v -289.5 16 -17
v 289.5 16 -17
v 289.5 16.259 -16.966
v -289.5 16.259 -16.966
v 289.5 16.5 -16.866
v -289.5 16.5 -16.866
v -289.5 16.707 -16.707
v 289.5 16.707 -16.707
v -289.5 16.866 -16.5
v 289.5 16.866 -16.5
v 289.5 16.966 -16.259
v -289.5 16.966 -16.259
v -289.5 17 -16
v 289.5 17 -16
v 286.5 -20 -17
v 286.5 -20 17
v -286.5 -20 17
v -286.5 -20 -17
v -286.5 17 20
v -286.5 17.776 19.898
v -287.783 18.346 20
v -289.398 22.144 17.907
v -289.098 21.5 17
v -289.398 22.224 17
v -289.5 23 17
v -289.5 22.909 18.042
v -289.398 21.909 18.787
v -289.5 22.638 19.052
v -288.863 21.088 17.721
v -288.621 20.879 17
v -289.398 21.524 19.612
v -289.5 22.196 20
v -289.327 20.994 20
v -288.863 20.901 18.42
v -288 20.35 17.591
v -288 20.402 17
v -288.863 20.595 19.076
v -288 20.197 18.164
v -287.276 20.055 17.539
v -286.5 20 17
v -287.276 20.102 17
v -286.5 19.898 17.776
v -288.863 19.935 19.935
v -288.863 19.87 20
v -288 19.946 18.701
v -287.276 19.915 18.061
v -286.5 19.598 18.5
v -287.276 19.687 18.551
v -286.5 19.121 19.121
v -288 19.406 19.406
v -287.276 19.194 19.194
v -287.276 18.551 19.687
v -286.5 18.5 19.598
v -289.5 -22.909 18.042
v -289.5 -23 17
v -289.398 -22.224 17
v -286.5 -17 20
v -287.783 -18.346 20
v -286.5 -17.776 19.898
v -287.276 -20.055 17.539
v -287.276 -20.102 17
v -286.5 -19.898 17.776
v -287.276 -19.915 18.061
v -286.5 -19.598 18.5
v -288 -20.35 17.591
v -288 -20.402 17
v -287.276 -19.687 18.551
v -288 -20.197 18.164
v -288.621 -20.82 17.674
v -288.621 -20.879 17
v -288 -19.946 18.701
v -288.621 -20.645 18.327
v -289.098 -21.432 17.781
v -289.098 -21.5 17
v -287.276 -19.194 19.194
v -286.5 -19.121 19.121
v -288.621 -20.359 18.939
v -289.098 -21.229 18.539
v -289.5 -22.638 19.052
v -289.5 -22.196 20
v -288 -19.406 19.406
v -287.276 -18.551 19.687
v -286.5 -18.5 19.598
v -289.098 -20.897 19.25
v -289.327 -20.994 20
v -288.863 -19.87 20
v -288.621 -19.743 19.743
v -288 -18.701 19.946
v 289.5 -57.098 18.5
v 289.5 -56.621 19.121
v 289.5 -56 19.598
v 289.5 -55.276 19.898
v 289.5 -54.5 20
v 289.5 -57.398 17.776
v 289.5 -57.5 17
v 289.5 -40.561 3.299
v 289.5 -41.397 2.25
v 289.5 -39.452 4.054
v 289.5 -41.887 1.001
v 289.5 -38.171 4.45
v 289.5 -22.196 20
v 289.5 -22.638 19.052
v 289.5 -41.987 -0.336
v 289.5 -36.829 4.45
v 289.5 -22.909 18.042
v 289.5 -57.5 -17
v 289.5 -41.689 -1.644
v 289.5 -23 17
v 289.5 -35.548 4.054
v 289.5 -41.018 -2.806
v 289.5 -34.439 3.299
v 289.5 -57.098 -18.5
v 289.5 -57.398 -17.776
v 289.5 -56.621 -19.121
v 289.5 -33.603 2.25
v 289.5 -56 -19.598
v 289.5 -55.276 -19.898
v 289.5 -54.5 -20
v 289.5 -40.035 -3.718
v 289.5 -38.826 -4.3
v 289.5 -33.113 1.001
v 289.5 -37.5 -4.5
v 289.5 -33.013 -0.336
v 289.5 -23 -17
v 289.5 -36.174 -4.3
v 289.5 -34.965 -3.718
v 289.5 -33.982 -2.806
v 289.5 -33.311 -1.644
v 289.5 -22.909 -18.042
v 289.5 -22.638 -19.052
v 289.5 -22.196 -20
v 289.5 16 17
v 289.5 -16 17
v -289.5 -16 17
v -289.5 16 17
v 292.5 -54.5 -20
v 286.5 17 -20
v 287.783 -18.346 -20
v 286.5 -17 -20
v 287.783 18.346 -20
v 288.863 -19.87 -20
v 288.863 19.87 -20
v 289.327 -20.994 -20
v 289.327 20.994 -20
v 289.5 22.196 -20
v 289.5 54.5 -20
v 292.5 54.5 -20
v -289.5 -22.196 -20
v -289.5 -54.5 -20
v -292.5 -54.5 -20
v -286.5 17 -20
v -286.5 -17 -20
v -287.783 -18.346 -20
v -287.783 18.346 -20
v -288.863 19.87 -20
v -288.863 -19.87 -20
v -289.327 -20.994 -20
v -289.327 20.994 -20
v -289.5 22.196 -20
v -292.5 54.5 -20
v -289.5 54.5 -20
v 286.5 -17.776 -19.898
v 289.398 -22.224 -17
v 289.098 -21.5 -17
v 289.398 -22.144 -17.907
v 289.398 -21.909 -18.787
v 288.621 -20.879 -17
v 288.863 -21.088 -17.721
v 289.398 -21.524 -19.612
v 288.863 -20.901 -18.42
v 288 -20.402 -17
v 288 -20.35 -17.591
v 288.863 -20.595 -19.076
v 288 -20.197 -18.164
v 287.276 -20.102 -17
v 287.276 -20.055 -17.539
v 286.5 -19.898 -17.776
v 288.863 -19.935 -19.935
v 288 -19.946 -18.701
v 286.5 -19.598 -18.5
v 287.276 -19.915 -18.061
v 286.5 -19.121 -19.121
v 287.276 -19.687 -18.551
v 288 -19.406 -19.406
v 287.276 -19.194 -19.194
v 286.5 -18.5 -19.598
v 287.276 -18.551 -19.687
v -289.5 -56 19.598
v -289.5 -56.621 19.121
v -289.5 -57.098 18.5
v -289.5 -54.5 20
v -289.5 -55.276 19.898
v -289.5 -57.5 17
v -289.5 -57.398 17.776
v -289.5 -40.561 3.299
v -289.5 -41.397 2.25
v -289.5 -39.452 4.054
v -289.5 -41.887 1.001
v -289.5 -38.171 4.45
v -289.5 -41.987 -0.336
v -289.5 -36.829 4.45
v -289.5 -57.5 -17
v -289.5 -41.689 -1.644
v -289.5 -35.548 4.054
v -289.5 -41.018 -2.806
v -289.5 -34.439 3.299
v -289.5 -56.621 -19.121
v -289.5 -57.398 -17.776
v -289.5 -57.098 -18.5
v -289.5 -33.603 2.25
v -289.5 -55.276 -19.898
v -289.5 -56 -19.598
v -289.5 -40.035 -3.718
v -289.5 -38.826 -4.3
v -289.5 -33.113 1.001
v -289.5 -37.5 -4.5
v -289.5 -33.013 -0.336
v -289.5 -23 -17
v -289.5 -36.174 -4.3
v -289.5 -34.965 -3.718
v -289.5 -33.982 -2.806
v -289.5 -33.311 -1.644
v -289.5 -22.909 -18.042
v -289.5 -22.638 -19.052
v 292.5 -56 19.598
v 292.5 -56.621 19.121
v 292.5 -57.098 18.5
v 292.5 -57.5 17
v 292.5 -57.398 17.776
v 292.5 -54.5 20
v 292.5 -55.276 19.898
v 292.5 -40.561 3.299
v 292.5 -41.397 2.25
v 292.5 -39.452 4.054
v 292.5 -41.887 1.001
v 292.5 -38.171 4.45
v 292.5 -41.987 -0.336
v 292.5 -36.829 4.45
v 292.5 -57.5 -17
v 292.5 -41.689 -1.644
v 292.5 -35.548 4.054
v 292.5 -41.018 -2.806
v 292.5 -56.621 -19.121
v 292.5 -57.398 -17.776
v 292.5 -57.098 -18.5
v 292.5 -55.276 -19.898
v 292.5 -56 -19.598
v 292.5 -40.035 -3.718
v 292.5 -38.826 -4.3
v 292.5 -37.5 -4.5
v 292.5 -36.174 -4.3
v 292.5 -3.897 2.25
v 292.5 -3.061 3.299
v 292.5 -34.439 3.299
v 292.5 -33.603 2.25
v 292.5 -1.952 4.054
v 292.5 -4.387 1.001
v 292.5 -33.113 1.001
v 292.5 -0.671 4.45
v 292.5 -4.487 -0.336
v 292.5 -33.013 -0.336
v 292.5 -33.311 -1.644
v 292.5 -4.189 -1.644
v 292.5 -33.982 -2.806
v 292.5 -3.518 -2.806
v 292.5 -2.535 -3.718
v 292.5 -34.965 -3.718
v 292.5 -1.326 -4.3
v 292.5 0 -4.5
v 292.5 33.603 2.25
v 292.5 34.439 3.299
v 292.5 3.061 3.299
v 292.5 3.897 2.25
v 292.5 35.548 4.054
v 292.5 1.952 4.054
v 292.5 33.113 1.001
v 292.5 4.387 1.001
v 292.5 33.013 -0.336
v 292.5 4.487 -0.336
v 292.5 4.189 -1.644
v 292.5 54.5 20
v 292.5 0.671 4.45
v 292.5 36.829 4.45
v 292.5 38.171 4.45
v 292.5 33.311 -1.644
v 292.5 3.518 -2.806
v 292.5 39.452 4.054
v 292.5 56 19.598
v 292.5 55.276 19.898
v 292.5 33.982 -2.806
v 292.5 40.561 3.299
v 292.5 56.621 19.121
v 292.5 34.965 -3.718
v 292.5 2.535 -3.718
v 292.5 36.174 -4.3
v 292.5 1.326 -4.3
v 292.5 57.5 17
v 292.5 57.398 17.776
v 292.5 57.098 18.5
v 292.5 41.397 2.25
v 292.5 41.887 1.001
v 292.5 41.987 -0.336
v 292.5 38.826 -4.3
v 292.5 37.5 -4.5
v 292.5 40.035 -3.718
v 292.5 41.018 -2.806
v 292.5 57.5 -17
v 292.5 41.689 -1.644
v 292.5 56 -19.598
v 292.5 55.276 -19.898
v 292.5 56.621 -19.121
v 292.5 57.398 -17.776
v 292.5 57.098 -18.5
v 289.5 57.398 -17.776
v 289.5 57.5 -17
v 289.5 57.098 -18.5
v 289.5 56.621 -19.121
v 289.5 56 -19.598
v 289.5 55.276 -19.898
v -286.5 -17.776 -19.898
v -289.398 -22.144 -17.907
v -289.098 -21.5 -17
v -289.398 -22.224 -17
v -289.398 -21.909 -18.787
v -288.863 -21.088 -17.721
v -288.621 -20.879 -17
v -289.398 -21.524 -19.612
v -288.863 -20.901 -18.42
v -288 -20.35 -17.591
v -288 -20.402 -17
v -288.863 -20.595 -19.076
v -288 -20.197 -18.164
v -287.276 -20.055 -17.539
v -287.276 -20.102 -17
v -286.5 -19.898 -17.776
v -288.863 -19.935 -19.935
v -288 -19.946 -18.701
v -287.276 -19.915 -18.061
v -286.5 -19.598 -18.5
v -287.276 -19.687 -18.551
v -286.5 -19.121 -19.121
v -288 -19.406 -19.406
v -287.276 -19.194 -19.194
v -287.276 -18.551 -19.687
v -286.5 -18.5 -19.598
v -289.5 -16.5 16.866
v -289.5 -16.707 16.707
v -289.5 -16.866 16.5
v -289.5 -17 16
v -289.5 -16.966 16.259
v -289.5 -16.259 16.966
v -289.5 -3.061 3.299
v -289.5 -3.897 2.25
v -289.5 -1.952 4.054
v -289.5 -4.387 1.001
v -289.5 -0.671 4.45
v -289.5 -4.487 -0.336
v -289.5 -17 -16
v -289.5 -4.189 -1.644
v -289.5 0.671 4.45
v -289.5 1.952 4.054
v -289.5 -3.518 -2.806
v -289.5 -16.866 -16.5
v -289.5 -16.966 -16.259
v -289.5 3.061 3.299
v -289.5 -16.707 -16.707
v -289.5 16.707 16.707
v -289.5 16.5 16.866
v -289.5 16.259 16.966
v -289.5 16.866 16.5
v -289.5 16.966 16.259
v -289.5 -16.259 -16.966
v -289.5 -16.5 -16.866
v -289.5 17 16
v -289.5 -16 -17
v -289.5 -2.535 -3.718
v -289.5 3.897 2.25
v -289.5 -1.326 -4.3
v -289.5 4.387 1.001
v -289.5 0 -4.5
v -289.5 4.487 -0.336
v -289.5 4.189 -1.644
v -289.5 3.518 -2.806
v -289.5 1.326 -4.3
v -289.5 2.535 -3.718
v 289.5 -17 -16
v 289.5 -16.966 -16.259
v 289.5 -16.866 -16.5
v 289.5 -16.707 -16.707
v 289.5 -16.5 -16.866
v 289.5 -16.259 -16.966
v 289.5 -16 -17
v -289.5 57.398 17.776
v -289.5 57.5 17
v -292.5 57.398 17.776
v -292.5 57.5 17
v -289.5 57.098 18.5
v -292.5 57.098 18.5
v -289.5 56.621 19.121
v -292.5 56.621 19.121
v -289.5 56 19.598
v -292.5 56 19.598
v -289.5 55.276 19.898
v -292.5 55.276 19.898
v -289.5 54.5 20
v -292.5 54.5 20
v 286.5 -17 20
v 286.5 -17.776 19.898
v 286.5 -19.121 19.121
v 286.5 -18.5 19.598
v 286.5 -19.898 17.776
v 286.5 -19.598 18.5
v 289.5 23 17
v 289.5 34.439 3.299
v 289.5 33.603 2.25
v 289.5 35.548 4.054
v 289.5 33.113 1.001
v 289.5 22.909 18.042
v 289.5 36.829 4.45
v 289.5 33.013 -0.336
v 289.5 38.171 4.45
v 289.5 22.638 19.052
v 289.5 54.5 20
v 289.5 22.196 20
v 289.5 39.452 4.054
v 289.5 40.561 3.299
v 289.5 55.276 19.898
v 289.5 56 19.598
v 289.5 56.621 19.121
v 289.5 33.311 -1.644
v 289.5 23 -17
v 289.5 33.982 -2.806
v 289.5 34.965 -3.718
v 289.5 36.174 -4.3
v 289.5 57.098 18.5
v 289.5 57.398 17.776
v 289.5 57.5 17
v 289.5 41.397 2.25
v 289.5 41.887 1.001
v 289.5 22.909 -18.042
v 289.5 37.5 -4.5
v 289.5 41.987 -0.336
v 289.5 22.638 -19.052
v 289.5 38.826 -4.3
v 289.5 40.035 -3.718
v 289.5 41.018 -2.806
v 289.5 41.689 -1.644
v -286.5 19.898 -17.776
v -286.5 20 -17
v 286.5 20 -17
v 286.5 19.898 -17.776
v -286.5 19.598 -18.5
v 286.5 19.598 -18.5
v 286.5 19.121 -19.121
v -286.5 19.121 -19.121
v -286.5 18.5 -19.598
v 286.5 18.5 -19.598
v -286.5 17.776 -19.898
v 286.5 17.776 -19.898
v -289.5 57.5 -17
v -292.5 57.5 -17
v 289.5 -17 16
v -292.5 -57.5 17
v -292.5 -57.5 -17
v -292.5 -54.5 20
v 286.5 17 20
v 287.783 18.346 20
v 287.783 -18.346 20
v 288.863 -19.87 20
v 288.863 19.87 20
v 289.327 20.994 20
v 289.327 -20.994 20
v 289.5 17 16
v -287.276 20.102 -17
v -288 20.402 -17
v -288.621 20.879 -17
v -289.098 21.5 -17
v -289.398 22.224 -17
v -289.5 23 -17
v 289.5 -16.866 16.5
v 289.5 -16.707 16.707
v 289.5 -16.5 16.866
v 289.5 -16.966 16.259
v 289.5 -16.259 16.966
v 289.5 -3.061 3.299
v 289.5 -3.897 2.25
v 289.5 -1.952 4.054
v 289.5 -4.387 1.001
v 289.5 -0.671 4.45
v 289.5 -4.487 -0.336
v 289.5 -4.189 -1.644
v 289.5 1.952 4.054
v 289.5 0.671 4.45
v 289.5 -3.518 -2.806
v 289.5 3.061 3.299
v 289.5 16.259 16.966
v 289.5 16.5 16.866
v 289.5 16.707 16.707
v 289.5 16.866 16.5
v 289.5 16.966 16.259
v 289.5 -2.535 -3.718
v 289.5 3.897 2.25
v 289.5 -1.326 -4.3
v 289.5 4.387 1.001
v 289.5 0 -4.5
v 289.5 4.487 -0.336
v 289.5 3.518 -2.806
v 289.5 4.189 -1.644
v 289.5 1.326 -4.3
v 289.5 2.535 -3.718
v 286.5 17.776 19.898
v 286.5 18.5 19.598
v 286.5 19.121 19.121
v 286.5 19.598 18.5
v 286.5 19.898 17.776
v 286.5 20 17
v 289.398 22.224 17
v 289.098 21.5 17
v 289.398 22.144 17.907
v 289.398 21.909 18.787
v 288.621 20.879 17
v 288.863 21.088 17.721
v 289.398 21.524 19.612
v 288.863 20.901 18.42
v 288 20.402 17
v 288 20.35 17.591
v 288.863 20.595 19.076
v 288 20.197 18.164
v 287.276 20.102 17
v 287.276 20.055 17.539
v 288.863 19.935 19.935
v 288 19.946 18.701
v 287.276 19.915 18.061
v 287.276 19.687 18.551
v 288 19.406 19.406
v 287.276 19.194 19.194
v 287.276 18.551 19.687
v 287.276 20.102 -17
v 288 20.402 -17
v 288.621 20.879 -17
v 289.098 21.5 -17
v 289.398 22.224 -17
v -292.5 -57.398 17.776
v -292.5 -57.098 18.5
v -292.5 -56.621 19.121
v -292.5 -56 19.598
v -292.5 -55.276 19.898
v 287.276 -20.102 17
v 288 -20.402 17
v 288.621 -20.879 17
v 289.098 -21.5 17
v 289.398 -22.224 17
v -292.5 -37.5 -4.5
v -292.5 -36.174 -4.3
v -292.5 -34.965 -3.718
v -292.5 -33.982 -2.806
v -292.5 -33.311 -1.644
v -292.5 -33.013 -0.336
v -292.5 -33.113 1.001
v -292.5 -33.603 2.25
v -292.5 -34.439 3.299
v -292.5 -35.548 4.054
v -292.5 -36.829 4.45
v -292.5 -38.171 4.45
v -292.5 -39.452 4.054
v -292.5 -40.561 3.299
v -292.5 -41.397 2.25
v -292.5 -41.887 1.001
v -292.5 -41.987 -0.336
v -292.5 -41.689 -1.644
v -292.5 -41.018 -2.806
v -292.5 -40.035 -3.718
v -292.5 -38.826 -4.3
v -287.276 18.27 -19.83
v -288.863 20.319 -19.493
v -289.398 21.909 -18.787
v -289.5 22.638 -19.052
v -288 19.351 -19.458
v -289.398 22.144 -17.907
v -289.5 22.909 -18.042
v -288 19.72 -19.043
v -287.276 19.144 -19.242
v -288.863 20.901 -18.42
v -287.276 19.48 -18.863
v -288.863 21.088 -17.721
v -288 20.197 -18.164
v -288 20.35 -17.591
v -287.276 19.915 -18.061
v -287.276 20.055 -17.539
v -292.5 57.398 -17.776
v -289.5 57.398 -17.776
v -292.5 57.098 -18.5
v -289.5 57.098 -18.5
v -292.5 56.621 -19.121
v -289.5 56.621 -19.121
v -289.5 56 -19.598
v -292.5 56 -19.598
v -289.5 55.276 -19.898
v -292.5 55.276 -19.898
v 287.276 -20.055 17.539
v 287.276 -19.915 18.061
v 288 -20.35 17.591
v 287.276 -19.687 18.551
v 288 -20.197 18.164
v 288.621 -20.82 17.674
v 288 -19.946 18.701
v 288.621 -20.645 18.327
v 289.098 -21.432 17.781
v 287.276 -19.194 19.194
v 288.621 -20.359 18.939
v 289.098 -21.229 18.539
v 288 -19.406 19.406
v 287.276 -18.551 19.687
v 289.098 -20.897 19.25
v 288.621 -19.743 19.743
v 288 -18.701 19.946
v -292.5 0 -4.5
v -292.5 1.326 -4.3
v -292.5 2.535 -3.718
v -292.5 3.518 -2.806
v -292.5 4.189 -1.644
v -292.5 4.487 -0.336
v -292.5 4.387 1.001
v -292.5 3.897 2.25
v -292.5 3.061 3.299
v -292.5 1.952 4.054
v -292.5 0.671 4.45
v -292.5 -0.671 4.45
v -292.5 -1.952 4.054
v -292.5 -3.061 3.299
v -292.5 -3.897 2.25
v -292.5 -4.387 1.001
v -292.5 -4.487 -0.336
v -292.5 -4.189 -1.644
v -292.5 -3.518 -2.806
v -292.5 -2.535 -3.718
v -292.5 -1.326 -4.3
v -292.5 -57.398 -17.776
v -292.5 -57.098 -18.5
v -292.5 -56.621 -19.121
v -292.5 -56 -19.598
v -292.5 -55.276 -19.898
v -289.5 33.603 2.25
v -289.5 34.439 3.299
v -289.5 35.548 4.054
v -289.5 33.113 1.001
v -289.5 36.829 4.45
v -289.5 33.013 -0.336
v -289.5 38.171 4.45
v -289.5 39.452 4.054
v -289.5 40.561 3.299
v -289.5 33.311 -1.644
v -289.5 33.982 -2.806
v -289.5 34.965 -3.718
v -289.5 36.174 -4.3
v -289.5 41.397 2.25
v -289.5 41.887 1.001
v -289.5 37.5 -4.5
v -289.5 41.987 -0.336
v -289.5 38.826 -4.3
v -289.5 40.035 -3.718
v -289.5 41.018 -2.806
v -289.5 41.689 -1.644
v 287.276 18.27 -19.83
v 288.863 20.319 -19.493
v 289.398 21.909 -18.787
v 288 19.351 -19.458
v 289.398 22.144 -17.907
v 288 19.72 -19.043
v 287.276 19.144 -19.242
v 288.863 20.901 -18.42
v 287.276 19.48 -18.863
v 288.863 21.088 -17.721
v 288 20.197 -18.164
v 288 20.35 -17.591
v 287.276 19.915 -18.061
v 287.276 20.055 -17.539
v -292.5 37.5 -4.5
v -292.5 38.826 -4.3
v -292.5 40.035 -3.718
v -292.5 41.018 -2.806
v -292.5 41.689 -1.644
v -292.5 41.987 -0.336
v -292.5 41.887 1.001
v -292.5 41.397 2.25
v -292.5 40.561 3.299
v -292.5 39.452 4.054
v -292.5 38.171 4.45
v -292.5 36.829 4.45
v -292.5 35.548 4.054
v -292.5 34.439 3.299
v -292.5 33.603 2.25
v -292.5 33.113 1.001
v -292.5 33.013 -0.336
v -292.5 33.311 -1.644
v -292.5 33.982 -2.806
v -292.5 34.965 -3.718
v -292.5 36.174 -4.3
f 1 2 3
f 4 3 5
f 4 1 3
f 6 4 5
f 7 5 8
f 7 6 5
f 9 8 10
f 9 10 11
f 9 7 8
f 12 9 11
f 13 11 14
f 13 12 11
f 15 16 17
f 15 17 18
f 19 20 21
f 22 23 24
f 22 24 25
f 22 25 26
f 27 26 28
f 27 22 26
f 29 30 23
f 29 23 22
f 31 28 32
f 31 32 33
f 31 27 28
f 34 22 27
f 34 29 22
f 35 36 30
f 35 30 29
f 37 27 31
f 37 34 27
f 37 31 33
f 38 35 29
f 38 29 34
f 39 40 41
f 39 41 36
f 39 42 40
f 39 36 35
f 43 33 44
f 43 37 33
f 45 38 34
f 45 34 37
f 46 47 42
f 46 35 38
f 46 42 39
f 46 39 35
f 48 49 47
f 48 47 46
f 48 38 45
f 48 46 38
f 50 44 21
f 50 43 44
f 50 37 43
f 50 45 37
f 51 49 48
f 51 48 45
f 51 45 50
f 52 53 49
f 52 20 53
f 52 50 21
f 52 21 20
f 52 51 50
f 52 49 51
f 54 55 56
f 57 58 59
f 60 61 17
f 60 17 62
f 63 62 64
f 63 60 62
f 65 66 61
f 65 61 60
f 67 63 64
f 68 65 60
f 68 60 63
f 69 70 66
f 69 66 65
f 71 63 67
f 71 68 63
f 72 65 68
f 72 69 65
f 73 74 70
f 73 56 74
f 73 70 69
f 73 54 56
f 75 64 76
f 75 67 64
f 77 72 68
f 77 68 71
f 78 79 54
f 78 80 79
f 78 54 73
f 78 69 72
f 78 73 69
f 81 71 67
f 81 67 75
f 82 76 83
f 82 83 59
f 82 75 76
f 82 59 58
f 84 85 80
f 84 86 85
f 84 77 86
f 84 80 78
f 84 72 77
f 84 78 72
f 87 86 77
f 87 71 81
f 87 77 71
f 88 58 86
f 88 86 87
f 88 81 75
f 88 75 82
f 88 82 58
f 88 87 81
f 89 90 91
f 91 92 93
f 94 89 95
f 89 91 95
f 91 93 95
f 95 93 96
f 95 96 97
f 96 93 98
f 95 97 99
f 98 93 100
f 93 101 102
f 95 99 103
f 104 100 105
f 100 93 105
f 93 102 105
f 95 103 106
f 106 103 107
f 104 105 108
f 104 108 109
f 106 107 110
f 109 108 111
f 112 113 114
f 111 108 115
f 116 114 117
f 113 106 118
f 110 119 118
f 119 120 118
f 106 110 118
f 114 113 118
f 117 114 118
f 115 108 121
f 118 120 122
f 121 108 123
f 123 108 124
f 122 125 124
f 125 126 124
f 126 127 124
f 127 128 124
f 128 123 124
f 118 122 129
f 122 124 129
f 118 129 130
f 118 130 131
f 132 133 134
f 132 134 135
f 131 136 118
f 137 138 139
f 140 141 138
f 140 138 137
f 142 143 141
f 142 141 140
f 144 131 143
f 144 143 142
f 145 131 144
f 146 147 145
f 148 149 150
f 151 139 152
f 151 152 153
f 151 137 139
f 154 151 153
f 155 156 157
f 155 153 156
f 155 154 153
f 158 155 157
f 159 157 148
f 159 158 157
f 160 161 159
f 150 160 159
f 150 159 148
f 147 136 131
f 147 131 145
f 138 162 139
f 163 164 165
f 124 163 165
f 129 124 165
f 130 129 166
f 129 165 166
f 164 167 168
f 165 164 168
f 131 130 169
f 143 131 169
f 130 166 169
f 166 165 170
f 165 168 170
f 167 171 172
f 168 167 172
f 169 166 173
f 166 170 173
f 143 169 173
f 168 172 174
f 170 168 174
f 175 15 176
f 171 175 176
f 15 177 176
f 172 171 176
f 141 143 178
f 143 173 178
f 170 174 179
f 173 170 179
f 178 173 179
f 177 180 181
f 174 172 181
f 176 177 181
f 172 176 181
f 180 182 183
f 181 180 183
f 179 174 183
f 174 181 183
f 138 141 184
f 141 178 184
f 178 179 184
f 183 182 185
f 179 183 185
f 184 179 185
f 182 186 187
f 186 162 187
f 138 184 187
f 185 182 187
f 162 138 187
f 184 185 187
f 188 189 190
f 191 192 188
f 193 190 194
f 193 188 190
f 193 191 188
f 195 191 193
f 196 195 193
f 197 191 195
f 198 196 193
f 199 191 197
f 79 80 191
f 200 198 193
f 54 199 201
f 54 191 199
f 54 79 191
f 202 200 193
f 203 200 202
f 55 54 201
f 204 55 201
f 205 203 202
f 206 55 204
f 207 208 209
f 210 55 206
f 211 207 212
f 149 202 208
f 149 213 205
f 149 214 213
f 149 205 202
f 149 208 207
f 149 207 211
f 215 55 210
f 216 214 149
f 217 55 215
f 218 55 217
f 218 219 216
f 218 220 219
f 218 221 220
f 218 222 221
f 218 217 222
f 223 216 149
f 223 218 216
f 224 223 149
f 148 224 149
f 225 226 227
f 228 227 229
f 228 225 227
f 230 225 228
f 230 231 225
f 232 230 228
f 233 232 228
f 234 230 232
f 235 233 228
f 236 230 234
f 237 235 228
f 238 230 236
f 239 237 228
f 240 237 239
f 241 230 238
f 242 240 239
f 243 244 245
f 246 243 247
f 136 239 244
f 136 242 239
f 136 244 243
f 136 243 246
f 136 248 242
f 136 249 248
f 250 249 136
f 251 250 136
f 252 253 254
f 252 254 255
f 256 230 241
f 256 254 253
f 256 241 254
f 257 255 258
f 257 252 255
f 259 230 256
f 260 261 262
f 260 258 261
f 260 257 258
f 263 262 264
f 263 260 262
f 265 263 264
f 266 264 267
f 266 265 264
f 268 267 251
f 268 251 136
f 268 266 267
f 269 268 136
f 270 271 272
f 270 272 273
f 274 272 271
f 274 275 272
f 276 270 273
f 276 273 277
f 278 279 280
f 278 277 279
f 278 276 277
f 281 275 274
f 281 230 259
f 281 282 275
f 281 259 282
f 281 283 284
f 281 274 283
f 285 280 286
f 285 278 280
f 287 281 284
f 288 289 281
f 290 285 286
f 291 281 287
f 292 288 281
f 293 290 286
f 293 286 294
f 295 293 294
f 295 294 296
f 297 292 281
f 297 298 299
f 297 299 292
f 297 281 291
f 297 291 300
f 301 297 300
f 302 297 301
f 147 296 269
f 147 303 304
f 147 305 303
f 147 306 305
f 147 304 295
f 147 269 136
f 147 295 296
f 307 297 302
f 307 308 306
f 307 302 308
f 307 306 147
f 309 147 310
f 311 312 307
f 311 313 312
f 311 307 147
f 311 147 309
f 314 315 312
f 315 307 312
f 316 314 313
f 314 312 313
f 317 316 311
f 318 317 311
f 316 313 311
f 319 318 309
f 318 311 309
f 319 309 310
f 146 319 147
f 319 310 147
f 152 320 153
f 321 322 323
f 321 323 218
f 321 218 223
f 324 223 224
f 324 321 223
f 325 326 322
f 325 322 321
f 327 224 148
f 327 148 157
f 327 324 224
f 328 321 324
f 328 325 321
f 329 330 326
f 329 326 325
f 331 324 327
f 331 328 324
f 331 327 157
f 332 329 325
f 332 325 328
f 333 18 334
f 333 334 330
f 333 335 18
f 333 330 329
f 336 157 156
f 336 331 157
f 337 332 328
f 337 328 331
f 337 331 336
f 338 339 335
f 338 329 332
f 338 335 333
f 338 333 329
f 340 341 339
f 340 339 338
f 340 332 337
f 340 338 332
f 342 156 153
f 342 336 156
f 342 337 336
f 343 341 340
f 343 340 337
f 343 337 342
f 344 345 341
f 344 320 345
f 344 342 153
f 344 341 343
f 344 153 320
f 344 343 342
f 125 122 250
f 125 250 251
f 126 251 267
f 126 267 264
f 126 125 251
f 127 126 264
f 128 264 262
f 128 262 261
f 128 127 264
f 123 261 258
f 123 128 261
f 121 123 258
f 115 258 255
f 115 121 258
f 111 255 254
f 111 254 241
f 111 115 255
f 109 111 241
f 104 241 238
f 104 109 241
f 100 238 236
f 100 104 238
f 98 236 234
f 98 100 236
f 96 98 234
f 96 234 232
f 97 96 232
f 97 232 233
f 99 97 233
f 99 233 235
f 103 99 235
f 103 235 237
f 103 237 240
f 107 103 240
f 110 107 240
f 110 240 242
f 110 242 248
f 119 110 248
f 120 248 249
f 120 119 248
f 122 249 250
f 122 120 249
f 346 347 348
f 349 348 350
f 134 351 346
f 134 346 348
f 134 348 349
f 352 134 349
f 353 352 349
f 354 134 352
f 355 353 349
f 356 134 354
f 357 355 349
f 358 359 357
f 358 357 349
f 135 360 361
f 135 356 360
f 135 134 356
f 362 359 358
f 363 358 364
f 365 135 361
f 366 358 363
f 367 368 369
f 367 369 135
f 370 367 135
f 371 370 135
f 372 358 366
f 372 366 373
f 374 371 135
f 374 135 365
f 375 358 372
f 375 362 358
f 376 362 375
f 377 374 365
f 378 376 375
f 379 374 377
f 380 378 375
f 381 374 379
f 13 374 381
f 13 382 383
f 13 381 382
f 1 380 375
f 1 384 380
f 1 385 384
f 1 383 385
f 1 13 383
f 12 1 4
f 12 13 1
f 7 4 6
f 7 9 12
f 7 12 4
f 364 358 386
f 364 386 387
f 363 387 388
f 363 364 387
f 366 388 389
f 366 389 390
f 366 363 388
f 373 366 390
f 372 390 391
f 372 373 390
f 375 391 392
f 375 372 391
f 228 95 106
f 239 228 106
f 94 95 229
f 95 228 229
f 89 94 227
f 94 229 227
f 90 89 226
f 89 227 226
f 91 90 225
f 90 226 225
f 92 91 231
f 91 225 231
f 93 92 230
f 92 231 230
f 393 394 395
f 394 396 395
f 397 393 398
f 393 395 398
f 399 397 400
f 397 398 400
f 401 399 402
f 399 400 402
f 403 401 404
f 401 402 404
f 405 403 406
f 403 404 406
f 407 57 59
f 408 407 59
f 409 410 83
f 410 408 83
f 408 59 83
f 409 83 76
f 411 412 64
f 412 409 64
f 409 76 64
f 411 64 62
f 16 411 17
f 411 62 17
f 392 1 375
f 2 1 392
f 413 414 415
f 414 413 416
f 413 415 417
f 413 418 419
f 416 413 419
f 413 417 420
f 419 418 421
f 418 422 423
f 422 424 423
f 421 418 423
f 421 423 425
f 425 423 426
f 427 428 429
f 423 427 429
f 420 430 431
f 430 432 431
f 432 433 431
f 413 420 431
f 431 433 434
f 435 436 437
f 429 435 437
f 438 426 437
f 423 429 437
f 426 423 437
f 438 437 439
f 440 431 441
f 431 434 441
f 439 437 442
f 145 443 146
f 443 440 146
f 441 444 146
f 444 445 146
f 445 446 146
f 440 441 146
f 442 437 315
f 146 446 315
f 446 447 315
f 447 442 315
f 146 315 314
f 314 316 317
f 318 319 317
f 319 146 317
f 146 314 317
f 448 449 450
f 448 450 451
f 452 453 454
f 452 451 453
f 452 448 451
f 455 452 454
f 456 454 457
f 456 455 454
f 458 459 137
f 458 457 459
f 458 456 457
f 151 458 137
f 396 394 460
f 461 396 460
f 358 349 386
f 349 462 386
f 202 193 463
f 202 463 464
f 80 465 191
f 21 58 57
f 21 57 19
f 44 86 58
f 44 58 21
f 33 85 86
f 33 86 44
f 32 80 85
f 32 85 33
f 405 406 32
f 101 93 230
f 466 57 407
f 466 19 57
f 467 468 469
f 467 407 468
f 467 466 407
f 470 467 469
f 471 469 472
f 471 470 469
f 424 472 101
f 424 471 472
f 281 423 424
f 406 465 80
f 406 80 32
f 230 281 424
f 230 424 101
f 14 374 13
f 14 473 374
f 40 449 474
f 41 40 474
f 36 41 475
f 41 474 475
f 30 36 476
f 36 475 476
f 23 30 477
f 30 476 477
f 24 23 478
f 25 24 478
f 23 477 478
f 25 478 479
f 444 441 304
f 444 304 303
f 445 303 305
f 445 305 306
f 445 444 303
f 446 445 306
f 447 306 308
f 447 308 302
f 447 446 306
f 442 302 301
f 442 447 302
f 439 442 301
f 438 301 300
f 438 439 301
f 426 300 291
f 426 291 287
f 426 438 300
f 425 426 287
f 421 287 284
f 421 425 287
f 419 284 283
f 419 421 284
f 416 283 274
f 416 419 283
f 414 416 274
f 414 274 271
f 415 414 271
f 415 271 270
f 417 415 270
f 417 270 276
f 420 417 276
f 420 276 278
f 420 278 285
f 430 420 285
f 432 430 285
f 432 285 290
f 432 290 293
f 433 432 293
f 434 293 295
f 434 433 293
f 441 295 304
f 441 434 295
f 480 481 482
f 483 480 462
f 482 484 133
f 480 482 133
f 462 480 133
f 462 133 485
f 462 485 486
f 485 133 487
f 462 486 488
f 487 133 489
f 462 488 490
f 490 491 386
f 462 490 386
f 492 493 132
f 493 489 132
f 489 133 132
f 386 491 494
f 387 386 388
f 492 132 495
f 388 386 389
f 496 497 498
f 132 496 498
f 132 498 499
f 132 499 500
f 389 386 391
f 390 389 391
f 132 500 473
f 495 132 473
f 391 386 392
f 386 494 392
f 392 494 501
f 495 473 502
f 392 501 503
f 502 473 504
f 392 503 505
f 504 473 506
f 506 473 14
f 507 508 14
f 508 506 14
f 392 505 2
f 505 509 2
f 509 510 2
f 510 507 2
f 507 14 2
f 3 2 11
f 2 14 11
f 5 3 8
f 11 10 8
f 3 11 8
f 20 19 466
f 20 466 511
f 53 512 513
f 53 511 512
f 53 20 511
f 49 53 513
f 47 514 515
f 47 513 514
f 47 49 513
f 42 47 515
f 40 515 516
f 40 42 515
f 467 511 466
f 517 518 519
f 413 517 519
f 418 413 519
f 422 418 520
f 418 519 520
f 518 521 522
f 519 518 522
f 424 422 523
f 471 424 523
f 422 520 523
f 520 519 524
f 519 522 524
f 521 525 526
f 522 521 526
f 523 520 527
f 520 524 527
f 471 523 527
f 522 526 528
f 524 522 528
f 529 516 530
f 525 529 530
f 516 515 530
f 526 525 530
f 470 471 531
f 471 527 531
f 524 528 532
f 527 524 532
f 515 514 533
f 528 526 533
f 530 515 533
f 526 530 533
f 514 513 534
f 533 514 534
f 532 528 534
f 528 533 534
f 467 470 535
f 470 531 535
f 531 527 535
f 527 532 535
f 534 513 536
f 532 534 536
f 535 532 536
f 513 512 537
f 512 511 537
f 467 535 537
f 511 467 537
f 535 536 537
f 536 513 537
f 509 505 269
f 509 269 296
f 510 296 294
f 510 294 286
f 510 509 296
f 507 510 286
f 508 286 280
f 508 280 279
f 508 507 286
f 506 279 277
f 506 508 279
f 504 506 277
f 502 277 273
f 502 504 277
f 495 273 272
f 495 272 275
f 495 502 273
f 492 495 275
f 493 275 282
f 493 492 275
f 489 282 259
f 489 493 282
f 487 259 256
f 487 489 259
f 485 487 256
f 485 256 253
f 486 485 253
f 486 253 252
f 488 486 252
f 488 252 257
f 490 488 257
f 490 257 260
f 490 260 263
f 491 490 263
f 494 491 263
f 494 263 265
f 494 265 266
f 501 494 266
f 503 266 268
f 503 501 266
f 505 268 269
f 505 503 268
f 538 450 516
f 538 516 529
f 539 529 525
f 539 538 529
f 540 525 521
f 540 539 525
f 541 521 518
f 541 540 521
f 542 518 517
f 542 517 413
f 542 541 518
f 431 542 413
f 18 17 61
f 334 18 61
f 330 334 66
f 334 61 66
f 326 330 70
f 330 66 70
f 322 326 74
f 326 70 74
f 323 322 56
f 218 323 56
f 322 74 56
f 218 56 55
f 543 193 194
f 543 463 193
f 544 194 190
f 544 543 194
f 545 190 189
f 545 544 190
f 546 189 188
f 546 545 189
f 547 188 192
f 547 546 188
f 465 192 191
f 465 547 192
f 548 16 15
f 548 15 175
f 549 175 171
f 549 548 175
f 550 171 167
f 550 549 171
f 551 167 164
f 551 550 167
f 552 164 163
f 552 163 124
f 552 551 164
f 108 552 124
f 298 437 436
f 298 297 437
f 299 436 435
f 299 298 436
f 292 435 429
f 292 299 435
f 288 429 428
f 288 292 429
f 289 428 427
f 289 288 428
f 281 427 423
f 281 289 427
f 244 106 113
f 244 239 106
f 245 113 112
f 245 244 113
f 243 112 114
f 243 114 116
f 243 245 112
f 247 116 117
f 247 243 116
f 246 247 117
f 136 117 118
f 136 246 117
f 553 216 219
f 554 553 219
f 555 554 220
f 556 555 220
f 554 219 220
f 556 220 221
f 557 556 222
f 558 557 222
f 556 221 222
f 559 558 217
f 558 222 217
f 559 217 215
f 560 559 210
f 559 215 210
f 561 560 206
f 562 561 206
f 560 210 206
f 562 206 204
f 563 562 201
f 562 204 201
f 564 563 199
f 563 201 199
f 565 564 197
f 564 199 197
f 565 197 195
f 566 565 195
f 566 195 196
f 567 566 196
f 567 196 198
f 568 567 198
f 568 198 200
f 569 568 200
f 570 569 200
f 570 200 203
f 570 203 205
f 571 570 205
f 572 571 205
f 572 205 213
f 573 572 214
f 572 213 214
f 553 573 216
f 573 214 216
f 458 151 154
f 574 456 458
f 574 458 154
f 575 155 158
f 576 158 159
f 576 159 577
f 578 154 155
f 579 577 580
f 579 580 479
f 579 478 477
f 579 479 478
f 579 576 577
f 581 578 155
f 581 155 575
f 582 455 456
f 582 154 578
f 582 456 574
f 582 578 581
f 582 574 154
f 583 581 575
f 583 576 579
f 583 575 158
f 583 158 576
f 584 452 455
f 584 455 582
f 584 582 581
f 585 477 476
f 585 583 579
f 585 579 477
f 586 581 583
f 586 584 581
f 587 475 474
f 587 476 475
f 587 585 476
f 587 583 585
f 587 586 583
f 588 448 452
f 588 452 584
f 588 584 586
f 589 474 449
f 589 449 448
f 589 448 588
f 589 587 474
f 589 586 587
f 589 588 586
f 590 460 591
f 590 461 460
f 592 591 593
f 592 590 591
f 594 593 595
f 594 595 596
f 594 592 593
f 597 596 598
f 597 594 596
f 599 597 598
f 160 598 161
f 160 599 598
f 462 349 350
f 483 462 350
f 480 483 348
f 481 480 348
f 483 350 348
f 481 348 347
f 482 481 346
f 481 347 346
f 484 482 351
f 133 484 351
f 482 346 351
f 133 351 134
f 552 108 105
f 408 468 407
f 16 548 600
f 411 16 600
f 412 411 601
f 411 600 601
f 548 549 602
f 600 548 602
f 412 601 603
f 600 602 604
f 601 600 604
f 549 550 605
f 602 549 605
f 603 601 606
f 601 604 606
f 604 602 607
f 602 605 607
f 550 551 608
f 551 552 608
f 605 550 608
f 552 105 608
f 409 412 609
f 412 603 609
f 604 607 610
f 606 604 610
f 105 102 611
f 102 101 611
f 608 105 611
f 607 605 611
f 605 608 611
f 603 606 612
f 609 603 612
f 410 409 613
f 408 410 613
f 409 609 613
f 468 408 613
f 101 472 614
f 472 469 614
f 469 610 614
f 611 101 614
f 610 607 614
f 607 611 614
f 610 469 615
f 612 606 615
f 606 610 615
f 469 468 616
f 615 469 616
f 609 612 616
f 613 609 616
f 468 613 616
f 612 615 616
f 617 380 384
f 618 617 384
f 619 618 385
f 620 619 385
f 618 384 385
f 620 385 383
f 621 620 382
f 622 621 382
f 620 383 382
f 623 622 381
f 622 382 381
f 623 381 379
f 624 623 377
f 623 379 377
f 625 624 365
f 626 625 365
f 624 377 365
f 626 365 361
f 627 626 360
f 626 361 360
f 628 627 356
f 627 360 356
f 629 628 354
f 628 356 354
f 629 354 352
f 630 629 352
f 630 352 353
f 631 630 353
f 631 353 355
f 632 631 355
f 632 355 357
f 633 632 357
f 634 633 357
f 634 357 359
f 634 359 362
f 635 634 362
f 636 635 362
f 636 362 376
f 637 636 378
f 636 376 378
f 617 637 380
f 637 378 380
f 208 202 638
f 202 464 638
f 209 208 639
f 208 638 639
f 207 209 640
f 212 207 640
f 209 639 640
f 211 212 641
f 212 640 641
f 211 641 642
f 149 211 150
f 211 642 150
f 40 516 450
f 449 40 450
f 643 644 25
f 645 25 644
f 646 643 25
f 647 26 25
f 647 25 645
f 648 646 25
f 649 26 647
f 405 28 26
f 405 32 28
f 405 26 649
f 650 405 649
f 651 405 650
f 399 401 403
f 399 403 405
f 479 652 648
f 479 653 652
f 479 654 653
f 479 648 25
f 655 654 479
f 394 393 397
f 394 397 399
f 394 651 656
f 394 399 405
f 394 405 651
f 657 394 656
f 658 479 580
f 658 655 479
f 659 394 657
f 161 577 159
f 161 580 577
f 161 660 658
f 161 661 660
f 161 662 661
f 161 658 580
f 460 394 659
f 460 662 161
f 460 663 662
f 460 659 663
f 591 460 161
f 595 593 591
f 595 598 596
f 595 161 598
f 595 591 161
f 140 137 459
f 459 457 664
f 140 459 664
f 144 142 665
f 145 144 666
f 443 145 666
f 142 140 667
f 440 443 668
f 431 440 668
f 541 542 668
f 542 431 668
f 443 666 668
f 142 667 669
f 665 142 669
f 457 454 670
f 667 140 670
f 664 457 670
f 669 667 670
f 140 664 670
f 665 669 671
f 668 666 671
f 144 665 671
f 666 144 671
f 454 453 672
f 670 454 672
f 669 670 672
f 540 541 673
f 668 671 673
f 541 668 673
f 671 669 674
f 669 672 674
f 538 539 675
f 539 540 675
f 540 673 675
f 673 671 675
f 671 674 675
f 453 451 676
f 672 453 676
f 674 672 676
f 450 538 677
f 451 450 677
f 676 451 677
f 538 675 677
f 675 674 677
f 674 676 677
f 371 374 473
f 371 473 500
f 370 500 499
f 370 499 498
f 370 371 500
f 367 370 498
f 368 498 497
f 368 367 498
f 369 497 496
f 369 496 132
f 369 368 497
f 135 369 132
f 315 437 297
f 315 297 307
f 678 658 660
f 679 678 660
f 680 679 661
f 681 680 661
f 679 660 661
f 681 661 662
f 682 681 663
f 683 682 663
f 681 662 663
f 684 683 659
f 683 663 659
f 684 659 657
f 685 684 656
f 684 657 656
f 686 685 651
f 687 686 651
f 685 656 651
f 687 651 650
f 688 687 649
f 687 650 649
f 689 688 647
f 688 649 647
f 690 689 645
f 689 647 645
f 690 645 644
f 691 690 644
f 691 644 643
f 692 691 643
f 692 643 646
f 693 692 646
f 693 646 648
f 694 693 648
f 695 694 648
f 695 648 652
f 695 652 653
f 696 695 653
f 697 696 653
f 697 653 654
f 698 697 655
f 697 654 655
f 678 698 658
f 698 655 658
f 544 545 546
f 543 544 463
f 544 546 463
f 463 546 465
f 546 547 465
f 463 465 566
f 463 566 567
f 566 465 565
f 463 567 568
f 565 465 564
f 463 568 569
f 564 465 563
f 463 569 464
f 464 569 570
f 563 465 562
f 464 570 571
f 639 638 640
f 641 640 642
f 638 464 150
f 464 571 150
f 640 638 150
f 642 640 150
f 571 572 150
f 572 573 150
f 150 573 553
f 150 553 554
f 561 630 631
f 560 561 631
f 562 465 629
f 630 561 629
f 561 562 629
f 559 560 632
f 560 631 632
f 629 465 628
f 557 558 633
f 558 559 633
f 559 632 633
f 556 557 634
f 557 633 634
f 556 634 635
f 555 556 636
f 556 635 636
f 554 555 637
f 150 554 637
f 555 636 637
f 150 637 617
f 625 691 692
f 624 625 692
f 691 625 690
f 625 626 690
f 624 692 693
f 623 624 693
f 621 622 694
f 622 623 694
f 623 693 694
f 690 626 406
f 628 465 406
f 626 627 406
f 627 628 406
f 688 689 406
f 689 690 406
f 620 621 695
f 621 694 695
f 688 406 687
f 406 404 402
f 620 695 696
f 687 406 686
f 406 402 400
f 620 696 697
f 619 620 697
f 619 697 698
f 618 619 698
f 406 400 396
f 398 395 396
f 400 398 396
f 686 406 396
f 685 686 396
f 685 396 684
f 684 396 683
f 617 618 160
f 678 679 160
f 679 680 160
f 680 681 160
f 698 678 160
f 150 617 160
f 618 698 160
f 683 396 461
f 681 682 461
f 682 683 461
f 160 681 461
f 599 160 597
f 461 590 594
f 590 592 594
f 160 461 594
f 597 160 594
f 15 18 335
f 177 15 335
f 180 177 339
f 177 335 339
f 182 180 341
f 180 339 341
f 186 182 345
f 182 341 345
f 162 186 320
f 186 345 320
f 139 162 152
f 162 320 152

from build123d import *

# Parameters (mm, degrees)
SKETCH1_W           = 40
SKETCH1_H           = 40
SKETCH1_W_2         = 34
SKETCH1_H_2         = 34
BOSS_EXTRUDE1_DEPTH = 289.5
FILLET1_R           = 1
FILLET2_R           = 3
SKETCH2_W           = 40
SKETCH2_H           = 115
SKETCH2_R           = 4.5
BOSS_EXTRUDE2_DEPTH = 3
FILLET3_R           = 3
FILLET4_R           = 3


with BuildPart() as part:
    # Sketch1 → Boss-Extrude1 (new body)
    with BuildSketch(Plane(origin=(0, 0, 0), x_dir=(0, 0, -1), z_dir=(1, 0, 0))):
        Rectangle(SKETCH1_W, SKETCH1_H)
        Rectangle(SKETCH1_W_2, SKETCH1_H_2, mode=Mode.SUBTRACT)
    extrude(amount=BOSS_EXTRUDE1_DEPTH)

    # Fillet1
    fillet1_edges = [part.edges().sort_by_distance(p)[0] for p in [
        (144.75, -17, -17),
        (144.75, 17, -17),
        (144.75, 17, 17),
        (144.75, -17, 17),
    ]]
    fillet(fillet1_edges, radius=FILLET1_R)

    # Fillet2
    fillet2_edges = [part.edges().sort_by_distance(p)[0] for p in [
        (144.75, -20, -20),
        (144.75, -20, 20),
        (144.75, 20, 20),
        (144.75, 20, -20),
    ]]
    fillet(fillet2_edges, radius=FILLET2_R)

    # Sketch2 → Boss-Extrude2 (add)
    with BuildSketch(Plane(origin=(289.5, 0, 0), x_dir=(0, 0, -1), z_dir=(1, 0, 0))):
        Rectangle(SKETCH2_W, SKETCH2_H)
        Circle(SKETCH2_R, mode=Mode.SUBTRACT)
        with Locations((0, -37.5)):
            Circle(SKETCH2_R, mode=Mode.SUBTRACT)
        with Locations((0, 37.5)):
            Circle(SKETCH2_R, mode=Mode.SUBTRACT)
    extrude(amount=BOSS_EXTRUDE2_DEPTH)

    # Fillet3
    # the kernel refuses this fillet: 3 mm, written as the material it adds along each edge
    with BuildSketch(Plane(origin=(289.5, -20, 17), x_dir=(0, -1, 0), z_dir=(0, 0, -1)), Plane(origin=(289.5, 20, -17), x_dir=(0, 1, 0), z_dir=(0, 0, 1))) as fillet3_piece_1:
        with BuildLine():
            CenterArc((FILLET3_R, FILLET3_R), FILLET3_R, 180, 90)
            Line((0, FILLET3_R), (0, 0))
            Line((0, 0), (FILLET3_R, 0))
        make_face()
    extrude(amount=34)
    with BuildSketch(Plane(origin=(289.5, 17, 17), x_dir=(0, 1, 0), z_dir=(0, 0, -1))) as fillet3_piece_2_section:
        with BuildLine():
            CenterArc((3 + FILLET3_R, -FILLET3_R), FILLET3_R, 90, 90)
            Line((3, -FILLET3_R), (3, 0))
            Line((3, 0), (3 + FILLET3_R, 0))
        make_face()
    fillet3_piece_2 = revolve(axis=Axis((289.5, 17, 17), (1, 0, 0)), revolution_arc=233.296989237, mode=Mode.PRIVATE)
    fillet3_piece_2 = split(fillet3_piece_2, bisect_by=Plane(origin=(288.998099396, 20.659325751, 20), z_dir=(0, 0, -1)), keep=Keep.TOP, mode=Mode.PRIVATE)
    fillet3_piece_2 = split(fillet3_piece_2, bisect_by=Plane(origin=(288.998099396, 20.659325751, 17), z_dir=(0, 0, 1)), keep=Keep.TOP, mode=Mode.PRIVATE)
    add(fillet3_piece_2)
    with BuildSketch(Plane(origin=(289.5, 17, -17), x_dir=(0, -0.5976672776328276, 0.8017442392976482), z_dir=(0, 0.8017442392976482, 0.5976672776328276))) as fillet3_piece_3_section:
        with BuildLine():
            CenterArc((3 + FILLET3_R, -FILLET3_R), FILLET3_R, 90, 90)
            Line((3, -FILLET3_R), (3, 0))
            Line((3, 0), (3 + FILLET3_R, 0))
        make_face()
    fillet3_piece_3 = revolve(axis=Axis((289.5, 17, -17), (1, 0, 0)), revolution_arc=233.296989237, mode=Mode.PRIVATE)
    fillet3_piece_3 = split(fillet3_piece_3, bisect_by=Plane(origin=(288.565115083, 19.249816872, -20), z_dir=(0, 0, 1)), keep=Keep.TOP, mode=Mode.PRIVATE)
    fillet3_piece_3 = split(fillet3_piece_3, bisect_by=Plane(origin=(288.565115083, 19.249816872, -17), z_dir=(0, 0, -1)), keep=Keep.TOP, mode=Mode.PRIVATE)
    add(fillet3_piece_3)
    with BuildSketch(Plane(origin=(289.5, -17, -17), x_dir=(0, -1, 0), z_dir=(0, 0, 1))) as fillet3_piece_4_section:
        with BuildLine():
            CenterArc((3 + FILLET3_R, -FILLET3_R), FILLET3_R, 90, 90)
            Line((3, -FILLET3_R), (3, 0))
            Line((3, 0), (3 + FILLET3_R, 0))
        make_face()
    fillet3_piece_4 = revolve(axis=Axis((289.5, -17, -17), (1, 0, 0)), revolution_arc=233.296989237, mode=Mode.PRIVATE)
    fillet3_piece_4 = split(fillet3_piece_4, bisect_by=Plane(origin=(288.998099396, -20.659325751, -20), z_dir=(0, 0, 1)), keep=Keep.TOP, mode=Mode.PRIVATE)
    fillet3_piece_4 = split(fillet3_piece_4, bisect_by=Plane(origin=(288.998099396, -20.659325751, -17), z_dir=(0, 0, -1)), keep=Keep.TOP, mode=Mode.PRIVATE)
    add(fillet3_piece_4)
    with BuildSketch(Plane(origin=(289.5, -17, 17), x_dir=(0, -1, 0), z_dir=(0, 0, -1))) as fillet3_piece_5_section:
        with BuildLine():
            CenterArc((3 + FILLET3_R, FILLET3_R), FILLET3_R, 180, 90)
            Line((3, FILLET3_R), (3, 0))
            Line((3, 0), (3 + FILLET3_R, 0))
        make_face()
    fillet3_piece_5 = revolve(axis=Axis((289.5, -17, 17), (-1, 0, 0)), revolution_arc=233.296989237, mode=Mode.PRIVATE)
    fillet3_piece_5 = split(fillet3_piece_5, bisect_by=Plane(origin=(288.998099366, -20.659325736, 20), z_dir=(0, 0, -1)), keep=Keep.TOP, mode=Mode.PRIVATE)
    fillet3_piece_5 = split(fillet3_piece_5, bisect_by=Plane(origin=(288.998099366, -20.659325736, 17), z_dir=(0, 0, 1)), keep=Keep.TOP, mode=Mode.PRIVATE)
    add(fillet3_piece_5)

    # Fillet4
    fillet4_edges = [part.edges().sort_by_distance(p)[0] for p in [
        (291, -57.5, -20),
        (291, 57.5, -20),
        (291, 57.5, 20),
        (291, -57.5, 20),
    ]]
    fillet(fillet4_edges, radius=FILLET4_R)

    # Mirror1: part across plane


with BuildPart() as part_1:
    add(part.part)
    add(part.part.mirror(Plane(origin=(0, 0, 0), x_dir=(0, 0, 1), z_dir=(1, 0, 0))))


solid = part_1.part
